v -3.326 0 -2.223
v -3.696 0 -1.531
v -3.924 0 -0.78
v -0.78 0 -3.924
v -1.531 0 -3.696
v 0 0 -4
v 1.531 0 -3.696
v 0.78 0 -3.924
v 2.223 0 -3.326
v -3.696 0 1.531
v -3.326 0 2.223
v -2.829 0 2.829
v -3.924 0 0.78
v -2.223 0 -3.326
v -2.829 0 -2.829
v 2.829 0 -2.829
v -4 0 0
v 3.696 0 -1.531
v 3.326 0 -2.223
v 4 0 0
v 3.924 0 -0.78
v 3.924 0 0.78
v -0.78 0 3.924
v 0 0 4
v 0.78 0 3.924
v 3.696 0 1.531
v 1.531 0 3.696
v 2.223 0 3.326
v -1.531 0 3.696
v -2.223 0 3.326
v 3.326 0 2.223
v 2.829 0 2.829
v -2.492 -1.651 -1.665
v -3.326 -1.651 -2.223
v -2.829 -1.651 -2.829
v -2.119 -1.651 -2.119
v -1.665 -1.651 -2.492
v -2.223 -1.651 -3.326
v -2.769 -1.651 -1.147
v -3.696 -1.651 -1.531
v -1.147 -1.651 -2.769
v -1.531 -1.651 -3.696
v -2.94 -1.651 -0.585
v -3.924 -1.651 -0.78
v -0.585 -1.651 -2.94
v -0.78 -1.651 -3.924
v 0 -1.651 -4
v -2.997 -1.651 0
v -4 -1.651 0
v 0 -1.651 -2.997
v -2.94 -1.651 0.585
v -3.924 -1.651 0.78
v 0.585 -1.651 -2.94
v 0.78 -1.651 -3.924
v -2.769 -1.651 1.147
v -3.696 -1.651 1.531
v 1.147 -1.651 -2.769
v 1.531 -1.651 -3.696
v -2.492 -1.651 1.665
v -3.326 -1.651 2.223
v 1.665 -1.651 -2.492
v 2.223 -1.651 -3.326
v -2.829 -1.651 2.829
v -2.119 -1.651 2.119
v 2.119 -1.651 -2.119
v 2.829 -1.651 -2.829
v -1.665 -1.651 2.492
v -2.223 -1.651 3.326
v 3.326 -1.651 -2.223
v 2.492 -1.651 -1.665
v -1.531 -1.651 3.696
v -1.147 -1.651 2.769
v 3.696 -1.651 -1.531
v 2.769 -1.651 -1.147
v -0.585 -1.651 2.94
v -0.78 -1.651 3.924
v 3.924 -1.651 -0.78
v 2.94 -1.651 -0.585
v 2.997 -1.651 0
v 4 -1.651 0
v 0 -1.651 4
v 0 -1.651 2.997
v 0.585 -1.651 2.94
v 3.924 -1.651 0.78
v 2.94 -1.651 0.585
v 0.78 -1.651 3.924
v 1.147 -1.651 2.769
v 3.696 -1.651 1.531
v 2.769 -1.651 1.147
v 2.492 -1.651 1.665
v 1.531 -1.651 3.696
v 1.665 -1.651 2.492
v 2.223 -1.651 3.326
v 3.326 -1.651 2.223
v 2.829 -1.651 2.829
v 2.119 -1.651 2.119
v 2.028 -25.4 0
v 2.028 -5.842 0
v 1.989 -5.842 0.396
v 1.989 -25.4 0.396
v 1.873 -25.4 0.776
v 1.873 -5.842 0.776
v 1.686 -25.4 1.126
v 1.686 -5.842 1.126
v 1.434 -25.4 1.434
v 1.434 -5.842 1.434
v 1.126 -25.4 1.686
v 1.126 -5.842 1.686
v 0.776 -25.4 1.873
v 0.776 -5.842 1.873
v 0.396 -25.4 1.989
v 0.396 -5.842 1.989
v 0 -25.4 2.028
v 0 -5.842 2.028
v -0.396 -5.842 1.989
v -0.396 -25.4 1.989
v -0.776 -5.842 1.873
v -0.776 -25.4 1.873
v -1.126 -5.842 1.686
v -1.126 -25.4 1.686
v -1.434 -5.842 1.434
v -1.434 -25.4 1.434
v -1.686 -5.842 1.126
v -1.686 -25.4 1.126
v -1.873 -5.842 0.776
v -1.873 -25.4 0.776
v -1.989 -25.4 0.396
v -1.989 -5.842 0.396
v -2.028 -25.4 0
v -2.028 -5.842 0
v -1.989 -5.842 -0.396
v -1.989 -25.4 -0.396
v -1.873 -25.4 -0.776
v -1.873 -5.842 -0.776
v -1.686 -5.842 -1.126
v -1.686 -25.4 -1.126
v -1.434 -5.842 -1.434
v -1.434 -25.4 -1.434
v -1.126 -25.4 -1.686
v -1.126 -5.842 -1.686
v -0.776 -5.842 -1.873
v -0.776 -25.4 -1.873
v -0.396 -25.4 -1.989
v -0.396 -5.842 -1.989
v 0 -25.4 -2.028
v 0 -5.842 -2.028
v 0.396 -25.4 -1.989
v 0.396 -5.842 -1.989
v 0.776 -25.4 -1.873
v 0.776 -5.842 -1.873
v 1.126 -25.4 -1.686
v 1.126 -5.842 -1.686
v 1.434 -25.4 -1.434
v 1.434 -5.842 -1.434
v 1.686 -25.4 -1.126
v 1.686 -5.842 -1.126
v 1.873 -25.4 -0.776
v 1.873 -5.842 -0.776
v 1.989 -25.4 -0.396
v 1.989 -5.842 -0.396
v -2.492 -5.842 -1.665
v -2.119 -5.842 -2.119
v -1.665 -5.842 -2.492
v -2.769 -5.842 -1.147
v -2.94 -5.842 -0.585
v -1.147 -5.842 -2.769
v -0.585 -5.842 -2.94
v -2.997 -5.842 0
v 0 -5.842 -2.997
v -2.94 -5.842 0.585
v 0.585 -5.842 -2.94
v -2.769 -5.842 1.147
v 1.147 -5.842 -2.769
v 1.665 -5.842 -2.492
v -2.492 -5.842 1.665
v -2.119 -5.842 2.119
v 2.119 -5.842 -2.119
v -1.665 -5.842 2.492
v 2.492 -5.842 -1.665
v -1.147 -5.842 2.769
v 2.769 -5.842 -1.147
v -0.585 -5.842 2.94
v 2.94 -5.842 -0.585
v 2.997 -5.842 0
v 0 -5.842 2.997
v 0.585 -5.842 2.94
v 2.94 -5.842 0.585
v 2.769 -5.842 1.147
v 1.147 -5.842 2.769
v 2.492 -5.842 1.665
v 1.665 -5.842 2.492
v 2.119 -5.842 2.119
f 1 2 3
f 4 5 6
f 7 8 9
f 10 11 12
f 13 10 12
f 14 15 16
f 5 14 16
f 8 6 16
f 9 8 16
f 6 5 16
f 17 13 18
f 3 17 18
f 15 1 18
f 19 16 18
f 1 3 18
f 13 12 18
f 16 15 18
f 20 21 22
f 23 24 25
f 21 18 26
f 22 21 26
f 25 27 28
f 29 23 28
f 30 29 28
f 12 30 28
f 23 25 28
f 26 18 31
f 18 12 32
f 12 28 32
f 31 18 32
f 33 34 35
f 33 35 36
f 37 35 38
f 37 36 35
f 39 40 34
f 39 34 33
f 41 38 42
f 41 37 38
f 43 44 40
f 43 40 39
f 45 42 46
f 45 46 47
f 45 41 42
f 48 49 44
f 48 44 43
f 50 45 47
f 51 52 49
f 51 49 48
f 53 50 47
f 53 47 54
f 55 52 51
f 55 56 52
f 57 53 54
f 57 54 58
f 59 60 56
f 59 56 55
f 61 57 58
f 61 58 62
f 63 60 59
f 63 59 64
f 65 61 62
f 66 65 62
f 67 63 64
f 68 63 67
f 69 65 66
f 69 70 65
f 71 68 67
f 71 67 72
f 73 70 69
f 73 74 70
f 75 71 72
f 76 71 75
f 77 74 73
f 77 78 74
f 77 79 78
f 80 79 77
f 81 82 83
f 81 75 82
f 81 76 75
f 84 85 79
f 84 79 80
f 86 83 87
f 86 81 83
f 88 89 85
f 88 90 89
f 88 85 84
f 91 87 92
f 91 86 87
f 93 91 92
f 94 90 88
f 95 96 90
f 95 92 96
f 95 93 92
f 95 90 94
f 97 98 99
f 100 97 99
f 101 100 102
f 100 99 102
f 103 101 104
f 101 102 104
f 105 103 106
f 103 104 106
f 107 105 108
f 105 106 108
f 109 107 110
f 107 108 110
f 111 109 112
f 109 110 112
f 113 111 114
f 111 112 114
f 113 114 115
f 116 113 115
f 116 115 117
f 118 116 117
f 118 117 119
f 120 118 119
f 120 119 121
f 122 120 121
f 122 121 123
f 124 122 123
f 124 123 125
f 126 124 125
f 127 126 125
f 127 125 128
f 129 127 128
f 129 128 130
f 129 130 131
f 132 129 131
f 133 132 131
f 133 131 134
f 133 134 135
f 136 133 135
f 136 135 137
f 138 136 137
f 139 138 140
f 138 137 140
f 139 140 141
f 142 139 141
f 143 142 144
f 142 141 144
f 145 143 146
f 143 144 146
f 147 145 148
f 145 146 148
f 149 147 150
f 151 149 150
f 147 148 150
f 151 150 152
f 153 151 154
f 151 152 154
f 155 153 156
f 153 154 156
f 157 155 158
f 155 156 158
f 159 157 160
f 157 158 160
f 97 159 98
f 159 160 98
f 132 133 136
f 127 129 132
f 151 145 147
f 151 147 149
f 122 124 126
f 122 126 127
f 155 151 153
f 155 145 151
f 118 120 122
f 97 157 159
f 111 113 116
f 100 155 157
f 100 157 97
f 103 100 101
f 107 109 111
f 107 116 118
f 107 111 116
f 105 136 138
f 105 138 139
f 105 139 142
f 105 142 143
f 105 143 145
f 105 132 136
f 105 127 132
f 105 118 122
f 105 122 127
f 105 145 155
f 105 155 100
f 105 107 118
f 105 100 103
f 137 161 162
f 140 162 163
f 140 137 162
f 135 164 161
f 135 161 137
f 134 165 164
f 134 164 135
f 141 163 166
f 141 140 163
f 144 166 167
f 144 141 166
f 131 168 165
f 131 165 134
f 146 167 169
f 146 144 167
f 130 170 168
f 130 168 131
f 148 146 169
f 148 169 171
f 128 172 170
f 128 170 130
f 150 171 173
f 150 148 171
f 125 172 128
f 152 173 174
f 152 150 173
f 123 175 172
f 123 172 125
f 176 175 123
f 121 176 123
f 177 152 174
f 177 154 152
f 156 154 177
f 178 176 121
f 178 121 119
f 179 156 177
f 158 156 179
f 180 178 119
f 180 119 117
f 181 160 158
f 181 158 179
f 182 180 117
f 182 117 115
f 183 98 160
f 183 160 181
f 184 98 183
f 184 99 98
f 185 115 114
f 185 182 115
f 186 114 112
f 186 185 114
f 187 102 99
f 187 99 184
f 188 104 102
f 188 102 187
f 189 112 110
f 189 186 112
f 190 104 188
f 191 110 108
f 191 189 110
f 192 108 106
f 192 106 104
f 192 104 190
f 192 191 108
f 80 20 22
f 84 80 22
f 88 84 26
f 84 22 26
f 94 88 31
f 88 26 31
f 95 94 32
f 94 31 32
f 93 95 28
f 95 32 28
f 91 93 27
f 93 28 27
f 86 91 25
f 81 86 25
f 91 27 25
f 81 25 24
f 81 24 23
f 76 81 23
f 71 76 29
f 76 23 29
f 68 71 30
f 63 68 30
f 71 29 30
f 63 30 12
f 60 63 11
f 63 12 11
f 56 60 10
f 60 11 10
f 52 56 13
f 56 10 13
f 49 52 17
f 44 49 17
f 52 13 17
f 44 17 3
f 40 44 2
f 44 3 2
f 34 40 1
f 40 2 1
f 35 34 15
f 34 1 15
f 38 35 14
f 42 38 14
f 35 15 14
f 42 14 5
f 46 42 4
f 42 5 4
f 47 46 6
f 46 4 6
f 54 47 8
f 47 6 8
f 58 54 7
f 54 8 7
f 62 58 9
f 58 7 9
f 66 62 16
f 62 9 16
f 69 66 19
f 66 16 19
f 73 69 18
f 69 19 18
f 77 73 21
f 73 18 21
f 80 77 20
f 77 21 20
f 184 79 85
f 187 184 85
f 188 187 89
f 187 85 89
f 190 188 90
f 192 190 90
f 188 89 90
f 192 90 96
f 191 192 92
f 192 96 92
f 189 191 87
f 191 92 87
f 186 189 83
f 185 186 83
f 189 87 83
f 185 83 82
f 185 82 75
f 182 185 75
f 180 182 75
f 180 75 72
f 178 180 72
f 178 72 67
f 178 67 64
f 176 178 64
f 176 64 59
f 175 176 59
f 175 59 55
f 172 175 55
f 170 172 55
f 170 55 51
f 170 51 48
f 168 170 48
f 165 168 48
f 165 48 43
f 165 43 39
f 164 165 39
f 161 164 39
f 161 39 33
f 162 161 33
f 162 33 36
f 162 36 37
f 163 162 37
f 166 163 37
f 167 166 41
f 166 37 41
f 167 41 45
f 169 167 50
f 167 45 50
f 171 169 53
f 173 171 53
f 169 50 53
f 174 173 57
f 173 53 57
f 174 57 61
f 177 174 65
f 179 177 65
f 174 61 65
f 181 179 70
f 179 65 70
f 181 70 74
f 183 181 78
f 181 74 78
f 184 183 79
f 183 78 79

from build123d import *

# Parameters (mm, degrees)
F0_R     = 2.9972
F1_DEPTH = 5.842
F0_R_2   = 4.0005
F2_DEPTH = 1.651
F3_R     = 2.027538
F4_DEPTH = 25.4


with BuildPart() as f1:
    # F0 (on Front) → F1 (new body)
    with BuildSketch(Plane.XZ):
        Circle(F0_R)
    extrude(amount=F1_DEPTH)

    # F0 (on Front) → F2 (join)
    with BuildSketch(Plane.XZ):
        Circle(F0_R_2)
        Circle(F0_R, mode=Mode.SUBTRACT)
    extrude(amount=F2_DEPTH)

    # F3 (on Front) → F4 (join)
    with BuildSketch(Plane.XZ):
        Circle(F3_R)
    extrude(amount=F4_DEPTH)


solid = f1.part
